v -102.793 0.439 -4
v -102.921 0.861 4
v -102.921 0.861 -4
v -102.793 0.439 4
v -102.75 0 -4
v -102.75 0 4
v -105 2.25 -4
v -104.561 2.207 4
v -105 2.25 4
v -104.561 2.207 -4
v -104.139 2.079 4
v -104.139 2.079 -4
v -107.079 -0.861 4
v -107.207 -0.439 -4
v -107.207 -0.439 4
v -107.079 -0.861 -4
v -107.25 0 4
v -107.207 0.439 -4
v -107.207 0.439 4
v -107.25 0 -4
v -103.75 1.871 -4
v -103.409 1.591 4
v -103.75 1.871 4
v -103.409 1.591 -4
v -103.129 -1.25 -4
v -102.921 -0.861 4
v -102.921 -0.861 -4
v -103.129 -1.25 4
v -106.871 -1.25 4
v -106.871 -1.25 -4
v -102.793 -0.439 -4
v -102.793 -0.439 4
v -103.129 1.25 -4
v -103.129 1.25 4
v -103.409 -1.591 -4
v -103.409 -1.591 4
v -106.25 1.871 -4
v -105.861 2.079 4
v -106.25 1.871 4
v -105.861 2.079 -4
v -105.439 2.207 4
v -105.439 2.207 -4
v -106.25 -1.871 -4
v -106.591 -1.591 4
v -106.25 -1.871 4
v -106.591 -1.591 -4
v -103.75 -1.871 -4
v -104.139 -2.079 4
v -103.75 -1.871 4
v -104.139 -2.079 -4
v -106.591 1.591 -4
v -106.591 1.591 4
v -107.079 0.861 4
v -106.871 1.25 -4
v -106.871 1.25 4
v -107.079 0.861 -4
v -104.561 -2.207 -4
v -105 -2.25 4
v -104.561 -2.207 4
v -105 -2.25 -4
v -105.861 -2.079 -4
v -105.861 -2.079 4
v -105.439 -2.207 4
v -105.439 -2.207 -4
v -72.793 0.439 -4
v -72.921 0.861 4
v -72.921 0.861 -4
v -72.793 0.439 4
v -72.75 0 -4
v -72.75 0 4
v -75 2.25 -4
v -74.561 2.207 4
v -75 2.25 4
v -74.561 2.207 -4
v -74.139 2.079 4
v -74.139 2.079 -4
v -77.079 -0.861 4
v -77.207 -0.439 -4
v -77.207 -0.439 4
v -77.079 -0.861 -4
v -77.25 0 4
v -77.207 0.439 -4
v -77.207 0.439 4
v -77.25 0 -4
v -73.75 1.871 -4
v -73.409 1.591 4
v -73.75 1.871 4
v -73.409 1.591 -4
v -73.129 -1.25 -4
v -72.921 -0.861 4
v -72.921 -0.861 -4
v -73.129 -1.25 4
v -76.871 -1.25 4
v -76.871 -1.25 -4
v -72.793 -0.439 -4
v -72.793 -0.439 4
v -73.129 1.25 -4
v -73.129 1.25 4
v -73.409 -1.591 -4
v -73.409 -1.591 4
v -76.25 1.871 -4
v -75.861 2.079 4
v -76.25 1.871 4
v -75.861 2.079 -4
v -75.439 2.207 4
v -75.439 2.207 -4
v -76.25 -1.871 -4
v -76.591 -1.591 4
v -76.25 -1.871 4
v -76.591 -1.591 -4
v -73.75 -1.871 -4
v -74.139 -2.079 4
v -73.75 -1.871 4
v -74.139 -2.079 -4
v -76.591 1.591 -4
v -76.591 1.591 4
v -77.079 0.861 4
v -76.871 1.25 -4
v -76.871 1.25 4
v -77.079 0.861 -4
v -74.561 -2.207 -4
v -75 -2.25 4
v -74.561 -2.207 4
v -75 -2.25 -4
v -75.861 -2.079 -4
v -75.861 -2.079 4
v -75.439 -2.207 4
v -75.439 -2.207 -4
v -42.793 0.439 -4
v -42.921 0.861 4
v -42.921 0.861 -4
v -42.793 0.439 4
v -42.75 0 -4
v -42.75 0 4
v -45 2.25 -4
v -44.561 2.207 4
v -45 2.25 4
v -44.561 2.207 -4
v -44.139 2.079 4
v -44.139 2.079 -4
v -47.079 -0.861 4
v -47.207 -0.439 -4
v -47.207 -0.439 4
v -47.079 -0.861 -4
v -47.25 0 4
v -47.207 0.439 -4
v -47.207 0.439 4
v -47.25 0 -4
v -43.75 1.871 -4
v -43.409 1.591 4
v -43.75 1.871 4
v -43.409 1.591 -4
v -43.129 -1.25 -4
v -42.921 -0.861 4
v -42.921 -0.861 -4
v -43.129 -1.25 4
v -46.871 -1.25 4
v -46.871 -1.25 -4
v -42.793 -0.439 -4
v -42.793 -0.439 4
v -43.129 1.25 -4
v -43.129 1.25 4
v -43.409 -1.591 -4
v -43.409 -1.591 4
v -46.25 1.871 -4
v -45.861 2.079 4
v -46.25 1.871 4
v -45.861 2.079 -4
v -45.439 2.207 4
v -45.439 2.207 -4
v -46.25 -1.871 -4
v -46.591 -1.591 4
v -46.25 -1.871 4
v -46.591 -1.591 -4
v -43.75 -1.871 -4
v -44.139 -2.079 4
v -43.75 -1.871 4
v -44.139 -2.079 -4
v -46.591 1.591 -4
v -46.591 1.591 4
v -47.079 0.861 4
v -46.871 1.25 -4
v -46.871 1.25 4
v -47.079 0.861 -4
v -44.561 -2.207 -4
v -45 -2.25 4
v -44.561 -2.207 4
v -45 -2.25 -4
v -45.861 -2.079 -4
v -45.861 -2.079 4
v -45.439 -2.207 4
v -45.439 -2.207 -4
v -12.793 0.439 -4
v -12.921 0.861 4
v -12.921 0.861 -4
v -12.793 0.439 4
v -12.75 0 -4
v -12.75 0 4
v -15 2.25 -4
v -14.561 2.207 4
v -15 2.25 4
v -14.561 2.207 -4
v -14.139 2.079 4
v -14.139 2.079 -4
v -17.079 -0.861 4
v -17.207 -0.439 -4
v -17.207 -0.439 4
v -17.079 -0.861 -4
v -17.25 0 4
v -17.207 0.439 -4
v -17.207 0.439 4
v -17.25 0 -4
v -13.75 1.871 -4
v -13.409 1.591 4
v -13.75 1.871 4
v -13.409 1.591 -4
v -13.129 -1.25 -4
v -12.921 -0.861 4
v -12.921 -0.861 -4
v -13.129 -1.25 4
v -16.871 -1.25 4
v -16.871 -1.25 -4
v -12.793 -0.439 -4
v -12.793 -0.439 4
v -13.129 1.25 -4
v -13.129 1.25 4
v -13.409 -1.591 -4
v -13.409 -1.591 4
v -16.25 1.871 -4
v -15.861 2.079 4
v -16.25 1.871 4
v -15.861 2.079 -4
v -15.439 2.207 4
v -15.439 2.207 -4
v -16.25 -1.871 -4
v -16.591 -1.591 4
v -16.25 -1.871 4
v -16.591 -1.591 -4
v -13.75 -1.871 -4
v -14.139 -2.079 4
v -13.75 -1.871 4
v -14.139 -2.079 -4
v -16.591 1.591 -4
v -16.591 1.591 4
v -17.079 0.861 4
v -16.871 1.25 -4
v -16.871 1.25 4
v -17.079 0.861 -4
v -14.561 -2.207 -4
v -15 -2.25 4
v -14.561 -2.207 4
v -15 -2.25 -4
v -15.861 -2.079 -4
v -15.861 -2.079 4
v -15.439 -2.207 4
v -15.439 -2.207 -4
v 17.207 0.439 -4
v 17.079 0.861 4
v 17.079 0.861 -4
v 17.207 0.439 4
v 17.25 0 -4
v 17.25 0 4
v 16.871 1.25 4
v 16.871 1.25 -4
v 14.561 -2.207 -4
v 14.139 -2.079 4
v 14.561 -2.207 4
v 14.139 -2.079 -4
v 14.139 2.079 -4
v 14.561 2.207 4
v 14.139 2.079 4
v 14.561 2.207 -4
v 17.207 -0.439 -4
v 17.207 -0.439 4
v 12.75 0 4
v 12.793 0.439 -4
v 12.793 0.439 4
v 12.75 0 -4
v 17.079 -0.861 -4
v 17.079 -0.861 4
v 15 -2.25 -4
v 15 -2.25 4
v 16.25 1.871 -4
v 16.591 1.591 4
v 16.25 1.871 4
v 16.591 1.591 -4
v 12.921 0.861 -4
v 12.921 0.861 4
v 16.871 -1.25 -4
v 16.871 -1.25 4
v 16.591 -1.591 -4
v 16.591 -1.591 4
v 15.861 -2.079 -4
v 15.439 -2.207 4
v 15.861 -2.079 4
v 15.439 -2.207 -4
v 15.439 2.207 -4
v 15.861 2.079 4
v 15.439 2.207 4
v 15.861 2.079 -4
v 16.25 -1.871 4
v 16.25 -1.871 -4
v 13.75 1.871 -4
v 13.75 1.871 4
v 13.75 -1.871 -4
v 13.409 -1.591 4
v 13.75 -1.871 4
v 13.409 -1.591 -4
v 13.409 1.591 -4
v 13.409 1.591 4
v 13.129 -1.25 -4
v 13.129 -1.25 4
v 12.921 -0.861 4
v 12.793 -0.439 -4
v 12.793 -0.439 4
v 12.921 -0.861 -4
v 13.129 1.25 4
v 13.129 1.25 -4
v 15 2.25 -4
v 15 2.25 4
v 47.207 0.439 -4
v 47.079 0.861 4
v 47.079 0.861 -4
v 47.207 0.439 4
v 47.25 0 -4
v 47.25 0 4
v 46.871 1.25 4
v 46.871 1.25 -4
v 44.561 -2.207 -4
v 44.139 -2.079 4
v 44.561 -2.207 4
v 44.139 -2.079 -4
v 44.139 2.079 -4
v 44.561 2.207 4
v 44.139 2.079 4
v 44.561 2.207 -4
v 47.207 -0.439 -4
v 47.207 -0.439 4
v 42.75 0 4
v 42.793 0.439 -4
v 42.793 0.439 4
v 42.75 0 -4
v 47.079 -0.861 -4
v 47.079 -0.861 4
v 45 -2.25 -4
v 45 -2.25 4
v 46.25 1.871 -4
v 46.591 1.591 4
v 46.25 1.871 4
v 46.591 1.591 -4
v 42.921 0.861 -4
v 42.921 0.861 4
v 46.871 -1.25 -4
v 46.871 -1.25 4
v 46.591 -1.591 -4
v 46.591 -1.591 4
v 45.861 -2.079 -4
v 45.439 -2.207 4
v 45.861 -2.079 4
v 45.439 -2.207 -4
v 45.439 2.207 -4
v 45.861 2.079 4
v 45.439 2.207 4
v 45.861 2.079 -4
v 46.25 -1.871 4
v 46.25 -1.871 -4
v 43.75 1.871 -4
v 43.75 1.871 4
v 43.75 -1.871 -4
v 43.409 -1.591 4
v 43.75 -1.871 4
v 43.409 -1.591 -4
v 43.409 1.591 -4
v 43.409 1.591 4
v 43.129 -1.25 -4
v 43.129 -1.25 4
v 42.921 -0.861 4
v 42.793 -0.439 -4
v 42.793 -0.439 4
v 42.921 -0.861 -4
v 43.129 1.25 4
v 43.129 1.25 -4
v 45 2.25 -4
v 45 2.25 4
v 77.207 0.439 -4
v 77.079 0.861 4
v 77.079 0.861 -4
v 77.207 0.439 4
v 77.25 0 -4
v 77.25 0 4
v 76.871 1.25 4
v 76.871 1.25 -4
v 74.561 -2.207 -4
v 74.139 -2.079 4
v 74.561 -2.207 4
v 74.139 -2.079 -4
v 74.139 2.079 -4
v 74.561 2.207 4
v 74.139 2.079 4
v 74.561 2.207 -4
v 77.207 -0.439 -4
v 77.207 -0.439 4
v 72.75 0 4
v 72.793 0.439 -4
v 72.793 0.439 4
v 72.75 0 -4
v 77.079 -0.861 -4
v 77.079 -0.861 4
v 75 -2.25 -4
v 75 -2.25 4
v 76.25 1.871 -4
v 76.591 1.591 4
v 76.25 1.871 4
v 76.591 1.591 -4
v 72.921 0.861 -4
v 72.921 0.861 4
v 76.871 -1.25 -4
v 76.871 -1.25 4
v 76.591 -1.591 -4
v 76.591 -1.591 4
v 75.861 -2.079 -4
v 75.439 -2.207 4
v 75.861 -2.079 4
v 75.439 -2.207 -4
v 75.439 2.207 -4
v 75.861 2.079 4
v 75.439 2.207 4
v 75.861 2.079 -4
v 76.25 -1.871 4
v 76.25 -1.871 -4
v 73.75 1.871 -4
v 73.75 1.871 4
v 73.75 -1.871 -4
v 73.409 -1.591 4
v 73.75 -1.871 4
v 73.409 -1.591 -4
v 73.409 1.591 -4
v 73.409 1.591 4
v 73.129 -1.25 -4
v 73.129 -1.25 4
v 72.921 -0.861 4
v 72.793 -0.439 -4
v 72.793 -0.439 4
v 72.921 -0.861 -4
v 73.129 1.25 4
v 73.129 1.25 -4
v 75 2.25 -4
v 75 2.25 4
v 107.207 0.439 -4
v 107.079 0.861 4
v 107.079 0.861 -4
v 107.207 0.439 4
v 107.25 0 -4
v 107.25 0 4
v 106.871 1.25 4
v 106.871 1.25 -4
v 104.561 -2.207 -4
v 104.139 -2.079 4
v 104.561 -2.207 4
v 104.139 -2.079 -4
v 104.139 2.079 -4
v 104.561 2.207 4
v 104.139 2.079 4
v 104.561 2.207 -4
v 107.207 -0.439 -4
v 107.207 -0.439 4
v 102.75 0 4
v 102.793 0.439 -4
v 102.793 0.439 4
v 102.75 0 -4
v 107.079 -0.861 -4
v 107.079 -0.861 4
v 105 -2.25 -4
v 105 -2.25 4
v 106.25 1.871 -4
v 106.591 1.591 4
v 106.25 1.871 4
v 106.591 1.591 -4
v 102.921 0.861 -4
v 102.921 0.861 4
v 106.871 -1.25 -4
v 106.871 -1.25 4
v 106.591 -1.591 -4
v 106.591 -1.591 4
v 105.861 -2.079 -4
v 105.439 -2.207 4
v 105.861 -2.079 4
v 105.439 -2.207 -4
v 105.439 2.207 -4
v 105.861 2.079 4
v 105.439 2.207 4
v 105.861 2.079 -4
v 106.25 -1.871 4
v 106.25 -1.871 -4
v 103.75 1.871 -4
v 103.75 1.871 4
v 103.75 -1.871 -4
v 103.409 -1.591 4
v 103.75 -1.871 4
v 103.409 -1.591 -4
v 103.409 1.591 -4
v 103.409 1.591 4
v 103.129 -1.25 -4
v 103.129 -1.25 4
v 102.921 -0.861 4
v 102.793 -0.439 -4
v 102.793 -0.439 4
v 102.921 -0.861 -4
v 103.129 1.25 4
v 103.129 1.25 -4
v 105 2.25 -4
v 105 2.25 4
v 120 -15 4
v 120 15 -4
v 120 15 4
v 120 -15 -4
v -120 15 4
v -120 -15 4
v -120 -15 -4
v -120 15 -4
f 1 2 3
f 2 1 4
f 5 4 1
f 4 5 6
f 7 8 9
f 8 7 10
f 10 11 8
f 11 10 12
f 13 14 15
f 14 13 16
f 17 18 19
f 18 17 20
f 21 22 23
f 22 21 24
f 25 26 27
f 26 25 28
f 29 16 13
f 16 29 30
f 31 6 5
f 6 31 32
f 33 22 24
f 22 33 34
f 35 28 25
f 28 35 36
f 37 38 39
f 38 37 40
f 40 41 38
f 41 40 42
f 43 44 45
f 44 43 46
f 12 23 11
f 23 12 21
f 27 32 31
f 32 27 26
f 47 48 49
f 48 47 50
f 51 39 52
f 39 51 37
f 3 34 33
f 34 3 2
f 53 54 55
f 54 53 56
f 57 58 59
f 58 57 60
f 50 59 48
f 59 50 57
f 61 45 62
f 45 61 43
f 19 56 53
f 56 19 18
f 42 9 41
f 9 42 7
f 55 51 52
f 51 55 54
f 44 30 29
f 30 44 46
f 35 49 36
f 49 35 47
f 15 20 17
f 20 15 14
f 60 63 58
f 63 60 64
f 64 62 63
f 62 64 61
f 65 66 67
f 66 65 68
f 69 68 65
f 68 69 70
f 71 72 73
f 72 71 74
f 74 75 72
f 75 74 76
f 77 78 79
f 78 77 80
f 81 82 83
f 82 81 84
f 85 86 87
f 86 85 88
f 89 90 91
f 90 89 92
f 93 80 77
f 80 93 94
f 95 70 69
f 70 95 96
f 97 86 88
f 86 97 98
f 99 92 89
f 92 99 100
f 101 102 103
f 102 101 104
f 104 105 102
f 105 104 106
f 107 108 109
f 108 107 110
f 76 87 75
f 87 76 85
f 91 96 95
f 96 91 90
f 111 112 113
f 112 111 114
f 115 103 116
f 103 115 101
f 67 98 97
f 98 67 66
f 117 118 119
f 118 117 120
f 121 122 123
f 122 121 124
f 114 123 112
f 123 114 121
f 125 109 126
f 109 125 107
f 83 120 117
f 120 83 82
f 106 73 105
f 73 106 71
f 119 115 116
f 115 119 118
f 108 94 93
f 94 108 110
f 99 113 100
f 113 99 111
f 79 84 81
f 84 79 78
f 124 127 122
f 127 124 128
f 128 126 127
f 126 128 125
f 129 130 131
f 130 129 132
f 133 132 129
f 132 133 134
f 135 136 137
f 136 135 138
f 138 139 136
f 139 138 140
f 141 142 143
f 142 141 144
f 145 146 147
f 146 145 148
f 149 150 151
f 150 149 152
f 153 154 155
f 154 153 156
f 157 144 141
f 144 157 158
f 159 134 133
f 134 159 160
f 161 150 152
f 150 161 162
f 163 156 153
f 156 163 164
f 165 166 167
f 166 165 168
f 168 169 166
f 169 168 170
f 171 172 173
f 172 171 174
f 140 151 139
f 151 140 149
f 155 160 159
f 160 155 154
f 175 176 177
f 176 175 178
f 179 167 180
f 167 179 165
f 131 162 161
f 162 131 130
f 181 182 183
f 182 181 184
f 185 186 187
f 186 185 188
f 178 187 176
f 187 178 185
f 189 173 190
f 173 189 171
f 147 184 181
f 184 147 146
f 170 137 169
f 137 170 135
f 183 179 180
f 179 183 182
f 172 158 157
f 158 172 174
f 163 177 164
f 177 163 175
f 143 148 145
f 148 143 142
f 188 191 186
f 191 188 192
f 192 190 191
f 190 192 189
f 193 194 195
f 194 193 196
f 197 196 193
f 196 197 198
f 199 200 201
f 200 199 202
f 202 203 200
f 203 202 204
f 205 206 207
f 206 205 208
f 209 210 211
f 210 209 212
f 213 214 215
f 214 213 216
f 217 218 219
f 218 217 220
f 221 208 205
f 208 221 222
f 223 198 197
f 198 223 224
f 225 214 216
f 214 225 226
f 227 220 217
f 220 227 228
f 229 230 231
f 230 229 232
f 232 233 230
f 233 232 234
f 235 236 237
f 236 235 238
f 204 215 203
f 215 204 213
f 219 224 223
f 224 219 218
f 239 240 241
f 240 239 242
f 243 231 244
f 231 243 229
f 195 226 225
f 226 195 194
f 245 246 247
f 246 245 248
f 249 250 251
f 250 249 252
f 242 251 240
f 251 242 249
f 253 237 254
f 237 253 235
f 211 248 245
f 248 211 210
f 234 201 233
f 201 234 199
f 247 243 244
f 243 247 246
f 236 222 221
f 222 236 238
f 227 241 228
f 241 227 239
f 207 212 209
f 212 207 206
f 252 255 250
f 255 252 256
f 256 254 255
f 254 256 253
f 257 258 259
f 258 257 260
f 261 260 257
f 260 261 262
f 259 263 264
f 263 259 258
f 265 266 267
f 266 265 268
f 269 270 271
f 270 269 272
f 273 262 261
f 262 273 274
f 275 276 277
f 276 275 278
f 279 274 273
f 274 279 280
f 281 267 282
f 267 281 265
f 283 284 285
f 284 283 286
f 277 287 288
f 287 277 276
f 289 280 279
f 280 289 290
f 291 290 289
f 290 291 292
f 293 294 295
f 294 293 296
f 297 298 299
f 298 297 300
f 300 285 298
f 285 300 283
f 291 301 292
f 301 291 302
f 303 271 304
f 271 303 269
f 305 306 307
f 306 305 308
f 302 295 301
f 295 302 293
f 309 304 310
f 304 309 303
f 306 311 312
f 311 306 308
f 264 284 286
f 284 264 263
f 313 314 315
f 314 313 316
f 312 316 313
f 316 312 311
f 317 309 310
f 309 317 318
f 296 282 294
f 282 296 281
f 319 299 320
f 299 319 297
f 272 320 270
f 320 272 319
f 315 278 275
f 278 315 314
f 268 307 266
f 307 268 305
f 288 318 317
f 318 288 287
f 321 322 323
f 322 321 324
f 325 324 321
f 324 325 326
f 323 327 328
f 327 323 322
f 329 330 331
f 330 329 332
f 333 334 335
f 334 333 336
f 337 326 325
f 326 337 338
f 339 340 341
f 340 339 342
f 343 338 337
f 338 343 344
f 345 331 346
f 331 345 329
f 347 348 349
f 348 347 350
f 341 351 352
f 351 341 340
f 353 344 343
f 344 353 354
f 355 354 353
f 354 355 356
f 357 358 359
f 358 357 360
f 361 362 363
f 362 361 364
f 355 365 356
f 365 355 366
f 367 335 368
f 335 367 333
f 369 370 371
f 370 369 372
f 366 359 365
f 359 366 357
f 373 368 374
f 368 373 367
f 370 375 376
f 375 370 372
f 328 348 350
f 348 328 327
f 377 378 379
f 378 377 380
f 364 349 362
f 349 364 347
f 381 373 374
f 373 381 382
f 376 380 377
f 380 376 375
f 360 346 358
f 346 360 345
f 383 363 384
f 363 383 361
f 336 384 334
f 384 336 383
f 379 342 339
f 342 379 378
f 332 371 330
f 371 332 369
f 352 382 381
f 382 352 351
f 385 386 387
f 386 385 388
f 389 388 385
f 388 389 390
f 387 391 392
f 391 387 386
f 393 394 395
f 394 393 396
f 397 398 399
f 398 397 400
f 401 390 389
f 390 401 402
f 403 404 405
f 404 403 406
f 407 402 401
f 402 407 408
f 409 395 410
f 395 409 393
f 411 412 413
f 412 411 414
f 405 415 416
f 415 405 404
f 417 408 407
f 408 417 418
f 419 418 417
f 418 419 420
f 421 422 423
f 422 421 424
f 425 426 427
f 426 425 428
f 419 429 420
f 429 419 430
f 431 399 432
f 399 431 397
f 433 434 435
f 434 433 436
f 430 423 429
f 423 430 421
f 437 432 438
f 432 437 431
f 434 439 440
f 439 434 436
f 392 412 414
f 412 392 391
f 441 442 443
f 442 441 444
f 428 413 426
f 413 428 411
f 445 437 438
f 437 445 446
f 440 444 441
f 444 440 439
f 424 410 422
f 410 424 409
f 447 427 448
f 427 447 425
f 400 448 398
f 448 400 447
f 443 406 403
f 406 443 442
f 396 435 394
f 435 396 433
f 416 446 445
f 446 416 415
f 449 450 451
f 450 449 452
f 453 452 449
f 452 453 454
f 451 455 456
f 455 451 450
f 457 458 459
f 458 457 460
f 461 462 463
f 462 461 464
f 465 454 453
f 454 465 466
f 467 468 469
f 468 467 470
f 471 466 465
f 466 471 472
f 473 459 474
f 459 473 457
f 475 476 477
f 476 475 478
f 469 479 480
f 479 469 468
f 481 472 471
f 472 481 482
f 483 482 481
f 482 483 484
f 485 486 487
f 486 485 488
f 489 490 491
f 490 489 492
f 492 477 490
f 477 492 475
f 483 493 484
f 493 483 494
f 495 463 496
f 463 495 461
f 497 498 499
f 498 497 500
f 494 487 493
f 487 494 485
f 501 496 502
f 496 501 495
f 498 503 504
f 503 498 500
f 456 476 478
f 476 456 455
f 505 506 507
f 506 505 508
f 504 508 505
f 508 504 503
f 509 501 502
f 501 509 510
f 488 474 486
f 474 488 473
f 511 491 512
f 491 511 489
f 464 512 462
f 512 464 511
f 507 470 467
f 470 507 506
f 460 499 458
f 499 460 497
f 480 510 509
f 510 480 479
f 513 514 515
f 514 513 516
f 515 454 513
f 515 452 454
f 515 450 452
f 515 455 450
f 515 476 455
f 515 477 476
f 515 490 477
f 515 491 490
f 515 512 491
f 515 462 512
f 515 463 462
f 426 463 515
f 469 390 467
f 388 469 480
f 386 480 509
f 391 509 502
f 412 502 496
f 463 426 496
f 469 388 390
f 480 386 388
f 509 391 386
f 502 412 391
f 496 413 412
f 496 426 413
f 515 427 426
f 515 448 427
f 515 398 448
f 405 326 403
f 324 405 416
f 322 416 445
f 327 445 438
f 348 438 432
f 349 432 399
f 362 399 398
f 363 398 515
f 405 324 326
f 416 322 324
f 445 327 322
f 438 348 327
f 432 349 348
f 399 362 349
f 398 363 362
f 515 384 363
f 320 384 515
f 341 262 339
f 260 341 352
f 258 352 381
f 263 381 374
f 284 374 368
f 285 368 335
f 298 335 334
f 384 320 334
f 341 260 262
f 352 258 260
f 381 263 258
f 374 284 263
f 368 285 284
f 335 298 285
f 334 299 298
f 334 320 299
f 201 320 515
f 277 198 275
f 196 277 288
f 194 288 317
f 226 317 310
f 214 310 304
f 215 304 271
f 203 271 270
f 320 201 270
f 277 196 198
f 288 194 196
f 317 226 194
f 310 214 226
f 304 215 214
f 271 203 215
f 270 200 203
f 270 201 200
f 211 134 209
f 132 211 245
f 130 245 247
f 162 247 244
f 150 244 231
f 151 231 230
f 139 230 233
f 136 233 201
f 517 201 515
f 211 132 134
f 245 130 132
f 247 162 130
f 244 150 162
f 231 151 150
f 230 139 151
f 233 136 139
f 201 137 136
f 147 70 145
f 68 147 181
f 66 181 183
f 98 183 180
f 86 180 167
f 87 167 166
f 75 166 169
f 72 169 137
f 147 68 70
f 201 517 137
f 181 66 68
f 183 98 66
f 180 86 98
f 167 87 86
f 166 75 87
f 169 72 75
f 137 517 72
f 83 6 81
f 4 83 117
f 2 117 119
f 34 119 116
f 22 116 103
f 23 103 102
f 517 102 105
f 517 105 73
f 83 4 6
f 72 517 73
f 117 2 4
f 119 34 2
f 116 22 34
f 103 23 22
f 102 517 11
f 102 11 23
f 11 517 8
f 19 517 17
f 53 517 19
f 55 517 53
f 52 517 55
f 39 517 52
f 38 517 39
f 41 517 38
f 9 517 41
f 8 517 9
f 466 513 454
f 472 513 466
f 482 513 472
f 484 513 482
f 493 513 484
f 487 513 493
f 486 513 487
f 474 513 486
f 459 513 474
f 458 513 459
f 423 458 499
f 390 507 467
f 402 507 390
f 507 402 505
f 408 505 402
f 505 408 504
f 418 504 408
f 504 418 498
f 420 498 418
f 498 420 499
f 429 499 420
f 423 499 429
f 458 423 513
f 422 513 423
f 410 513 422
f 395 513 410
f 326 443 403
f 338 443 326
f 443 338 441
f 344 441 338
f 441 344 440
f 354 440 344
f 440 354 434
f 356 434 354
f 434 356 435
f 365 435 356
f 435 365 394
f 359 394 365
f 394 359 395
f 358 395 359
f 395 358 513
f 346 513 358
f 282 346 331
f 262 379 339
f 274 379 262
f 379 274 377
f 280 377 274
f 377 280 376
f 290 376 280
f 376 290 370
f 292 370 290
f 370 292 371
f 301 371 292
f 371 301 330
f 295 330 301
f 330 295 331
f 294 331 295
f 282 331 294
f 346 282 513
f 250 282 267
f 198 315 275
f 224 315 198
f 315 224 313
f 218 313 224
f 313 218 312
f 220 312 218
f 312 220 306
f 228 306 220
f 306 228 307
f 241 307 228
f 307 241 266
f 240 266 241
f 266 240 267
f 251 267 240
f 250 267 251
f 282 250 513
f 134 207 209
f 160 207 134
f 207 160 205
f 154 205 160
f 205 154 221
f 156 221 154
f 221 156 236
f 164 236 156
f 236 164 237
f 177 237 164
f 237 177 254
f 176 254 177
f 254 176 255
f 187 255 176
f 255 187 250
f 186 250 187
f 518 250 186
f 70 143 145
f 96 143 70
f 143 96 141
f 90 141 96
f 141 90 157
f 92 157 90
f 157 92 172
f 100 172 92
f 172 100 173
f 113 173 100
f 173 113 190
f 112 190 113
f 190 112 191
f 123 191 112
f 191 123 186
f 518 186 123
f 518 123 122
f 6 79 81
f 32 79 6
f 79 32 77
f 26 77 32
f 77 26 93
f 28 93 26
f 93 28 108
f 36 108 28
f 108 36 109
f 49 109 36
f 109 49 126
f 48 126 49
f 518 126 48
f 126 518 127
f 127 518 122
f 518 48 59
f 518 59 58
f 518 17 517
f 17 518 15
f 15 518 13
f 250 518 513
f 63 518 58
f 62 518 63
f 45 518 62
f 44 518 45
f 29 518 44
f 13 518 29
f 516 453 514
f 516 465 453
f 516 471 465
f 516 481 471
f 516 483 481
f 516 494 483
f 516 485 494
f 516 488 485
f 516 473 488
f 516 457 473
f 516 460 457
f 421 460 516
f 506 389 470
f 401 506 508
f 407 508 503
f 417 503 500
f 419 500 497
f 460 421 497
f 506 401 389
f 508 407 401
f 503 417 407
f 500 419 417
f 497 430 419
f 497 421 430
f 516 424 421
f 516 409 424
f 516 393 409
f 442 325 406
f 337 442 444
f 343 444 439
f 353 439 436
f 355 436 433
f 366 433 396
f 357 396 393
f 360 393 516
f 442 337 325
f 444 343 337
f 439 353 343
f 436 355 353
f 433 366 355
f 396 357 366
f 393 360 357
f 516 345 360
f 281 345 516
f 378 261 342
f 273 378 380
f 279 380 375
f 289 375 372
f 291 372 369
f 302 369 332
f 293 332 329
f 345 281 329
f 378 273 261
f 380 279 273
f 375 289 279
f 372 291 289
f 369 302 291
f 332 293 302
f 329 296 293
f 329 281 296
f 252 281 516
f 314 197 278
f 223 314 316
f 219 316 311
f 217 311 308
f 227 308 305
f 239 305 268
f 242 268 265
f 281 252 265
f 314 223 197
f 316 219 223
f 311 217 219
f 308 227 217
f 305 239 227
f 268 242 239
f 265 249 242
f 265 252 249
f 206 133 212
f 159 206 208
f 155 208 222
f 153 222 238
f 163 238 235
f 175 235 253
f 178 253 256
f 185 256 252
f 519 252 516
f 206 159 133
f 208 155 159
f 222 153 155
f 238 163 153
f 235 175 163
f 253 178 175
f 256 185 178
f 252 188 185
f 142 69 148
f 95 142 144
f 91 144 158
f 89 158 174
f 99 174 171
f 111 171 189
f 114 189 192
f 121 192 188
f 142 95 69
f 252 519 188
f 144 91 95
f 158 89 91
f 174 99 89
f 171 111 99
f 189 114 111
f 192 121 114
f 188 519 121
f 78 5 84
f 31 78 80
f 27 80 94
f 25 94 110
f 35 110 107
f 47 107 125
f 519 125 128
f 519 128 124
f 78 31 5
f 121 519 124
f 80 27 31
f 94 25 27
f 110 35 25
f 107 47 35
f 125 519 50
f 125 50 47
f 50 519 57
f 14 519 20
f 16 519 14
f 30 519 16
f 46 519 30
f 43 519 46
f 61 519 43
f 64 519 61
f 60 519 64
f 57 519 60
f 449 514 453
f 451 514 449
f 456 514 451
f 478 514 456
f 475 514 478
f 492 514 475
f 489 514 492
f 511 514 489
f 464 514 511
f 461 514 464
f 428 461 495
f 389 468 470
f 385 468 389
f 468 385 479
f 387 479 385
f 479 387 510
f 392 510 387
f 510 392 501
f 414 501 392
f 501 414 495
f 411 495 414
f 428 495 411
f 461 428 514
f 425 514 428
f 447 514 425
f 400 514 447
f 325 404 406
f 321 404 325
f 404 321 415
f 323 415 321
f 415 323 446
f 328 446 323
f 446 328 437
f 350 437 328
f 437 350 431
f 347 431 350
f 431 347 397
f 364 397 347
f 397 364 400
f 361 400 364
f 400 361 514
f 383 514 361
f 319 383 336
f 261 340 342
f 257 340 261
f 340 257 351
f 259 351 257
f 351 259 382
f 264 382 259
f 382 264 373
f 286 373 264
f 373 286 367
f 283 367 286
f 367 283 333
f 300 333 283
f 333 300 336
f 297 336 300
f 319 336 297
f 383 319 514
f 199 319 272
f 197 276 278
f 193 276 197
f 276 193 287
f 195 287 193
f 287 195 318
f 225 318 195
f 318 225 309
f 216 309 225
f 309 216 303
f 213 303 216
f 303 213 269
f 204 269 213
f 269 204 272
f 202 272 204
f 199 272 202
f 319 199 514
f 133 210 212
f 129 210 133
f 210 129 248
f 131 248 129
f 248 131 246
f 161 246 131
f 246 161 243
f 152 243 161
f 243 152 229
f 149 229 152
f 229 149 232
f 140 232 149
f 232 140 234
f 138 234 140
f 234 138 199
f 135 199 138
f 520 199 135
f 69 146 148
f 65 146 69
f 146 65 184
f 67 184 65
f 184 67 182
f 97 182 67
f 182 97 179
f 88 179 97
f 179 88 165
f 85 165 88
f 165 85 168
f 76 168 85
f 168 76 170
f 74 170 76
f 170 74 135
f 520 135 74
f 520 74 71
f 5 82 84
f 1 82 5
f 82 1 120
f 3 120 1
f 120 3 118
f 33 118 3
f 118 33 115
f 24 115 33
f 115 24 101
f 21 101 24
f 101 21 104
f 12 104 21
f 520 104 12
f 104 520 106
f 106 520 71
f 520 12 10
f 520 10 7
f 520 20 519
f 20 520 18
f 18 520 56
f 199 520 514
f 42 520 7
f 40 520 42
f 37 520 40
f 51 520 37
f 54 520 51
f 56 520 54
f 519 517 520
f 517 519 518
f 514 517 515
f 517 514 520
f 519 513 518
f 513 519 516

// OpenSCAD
$fn = 32;

// ----------------------------------------------------------------------
// Hole bar, 8 x Ø4.5
// skip layout, 15 mm edge offset
// ----------------------------------------------------------------------

// --- parameters (mm) ---
bar_w = 30;       // bar width (Y)
bar_t = 8;        // bar thickness (Z)
holes = 8;        // holes per row
hole_d = 4.5;     // hole diameter
edge = 15;        // offset from the bar end to the first hole
grid_pitch = 15;  // grid the bar was laid out on

// --- derived feature positions (mm) ---
pitch = grid_pitch * 2;       // = 30   holes sit every other grid slot
span = (holes - 1) * pitch;   // = 210   distance between the end holes
bar_l = span + 2 * edge;      // = 240   overall bar length
start_x = -bar_l / 2 + edge;  // = -105   X of the first hole
feature_centers = [
  [start_x + 0 * pitch, 0],
  [start_x + 1 * pitch, 0],
  [start_x + 2 * pitch, 0],
  [start_x + 3 * pitch, 0],
  [start_x + 4 * pitch, 0],
  [start_x + 5 * pitch, 0],
  [start_x + 6 * pitch, 0],
  [start_x + 7 * pitch, 0]
];   // hole centres of the first row

// bar with one row of holes, drilled from feature_centers
difference() {
  translate([-bar_l / 2, -bar_w / 2, -bar_t / 2]) cube([bar_l, bar_w, bar_t]);
  for (centre = feature_centers)
    translate([centre[0], centre[1], 0])
      cylinder(d = hole_d, h = bar_t + 2, center = true);
}
